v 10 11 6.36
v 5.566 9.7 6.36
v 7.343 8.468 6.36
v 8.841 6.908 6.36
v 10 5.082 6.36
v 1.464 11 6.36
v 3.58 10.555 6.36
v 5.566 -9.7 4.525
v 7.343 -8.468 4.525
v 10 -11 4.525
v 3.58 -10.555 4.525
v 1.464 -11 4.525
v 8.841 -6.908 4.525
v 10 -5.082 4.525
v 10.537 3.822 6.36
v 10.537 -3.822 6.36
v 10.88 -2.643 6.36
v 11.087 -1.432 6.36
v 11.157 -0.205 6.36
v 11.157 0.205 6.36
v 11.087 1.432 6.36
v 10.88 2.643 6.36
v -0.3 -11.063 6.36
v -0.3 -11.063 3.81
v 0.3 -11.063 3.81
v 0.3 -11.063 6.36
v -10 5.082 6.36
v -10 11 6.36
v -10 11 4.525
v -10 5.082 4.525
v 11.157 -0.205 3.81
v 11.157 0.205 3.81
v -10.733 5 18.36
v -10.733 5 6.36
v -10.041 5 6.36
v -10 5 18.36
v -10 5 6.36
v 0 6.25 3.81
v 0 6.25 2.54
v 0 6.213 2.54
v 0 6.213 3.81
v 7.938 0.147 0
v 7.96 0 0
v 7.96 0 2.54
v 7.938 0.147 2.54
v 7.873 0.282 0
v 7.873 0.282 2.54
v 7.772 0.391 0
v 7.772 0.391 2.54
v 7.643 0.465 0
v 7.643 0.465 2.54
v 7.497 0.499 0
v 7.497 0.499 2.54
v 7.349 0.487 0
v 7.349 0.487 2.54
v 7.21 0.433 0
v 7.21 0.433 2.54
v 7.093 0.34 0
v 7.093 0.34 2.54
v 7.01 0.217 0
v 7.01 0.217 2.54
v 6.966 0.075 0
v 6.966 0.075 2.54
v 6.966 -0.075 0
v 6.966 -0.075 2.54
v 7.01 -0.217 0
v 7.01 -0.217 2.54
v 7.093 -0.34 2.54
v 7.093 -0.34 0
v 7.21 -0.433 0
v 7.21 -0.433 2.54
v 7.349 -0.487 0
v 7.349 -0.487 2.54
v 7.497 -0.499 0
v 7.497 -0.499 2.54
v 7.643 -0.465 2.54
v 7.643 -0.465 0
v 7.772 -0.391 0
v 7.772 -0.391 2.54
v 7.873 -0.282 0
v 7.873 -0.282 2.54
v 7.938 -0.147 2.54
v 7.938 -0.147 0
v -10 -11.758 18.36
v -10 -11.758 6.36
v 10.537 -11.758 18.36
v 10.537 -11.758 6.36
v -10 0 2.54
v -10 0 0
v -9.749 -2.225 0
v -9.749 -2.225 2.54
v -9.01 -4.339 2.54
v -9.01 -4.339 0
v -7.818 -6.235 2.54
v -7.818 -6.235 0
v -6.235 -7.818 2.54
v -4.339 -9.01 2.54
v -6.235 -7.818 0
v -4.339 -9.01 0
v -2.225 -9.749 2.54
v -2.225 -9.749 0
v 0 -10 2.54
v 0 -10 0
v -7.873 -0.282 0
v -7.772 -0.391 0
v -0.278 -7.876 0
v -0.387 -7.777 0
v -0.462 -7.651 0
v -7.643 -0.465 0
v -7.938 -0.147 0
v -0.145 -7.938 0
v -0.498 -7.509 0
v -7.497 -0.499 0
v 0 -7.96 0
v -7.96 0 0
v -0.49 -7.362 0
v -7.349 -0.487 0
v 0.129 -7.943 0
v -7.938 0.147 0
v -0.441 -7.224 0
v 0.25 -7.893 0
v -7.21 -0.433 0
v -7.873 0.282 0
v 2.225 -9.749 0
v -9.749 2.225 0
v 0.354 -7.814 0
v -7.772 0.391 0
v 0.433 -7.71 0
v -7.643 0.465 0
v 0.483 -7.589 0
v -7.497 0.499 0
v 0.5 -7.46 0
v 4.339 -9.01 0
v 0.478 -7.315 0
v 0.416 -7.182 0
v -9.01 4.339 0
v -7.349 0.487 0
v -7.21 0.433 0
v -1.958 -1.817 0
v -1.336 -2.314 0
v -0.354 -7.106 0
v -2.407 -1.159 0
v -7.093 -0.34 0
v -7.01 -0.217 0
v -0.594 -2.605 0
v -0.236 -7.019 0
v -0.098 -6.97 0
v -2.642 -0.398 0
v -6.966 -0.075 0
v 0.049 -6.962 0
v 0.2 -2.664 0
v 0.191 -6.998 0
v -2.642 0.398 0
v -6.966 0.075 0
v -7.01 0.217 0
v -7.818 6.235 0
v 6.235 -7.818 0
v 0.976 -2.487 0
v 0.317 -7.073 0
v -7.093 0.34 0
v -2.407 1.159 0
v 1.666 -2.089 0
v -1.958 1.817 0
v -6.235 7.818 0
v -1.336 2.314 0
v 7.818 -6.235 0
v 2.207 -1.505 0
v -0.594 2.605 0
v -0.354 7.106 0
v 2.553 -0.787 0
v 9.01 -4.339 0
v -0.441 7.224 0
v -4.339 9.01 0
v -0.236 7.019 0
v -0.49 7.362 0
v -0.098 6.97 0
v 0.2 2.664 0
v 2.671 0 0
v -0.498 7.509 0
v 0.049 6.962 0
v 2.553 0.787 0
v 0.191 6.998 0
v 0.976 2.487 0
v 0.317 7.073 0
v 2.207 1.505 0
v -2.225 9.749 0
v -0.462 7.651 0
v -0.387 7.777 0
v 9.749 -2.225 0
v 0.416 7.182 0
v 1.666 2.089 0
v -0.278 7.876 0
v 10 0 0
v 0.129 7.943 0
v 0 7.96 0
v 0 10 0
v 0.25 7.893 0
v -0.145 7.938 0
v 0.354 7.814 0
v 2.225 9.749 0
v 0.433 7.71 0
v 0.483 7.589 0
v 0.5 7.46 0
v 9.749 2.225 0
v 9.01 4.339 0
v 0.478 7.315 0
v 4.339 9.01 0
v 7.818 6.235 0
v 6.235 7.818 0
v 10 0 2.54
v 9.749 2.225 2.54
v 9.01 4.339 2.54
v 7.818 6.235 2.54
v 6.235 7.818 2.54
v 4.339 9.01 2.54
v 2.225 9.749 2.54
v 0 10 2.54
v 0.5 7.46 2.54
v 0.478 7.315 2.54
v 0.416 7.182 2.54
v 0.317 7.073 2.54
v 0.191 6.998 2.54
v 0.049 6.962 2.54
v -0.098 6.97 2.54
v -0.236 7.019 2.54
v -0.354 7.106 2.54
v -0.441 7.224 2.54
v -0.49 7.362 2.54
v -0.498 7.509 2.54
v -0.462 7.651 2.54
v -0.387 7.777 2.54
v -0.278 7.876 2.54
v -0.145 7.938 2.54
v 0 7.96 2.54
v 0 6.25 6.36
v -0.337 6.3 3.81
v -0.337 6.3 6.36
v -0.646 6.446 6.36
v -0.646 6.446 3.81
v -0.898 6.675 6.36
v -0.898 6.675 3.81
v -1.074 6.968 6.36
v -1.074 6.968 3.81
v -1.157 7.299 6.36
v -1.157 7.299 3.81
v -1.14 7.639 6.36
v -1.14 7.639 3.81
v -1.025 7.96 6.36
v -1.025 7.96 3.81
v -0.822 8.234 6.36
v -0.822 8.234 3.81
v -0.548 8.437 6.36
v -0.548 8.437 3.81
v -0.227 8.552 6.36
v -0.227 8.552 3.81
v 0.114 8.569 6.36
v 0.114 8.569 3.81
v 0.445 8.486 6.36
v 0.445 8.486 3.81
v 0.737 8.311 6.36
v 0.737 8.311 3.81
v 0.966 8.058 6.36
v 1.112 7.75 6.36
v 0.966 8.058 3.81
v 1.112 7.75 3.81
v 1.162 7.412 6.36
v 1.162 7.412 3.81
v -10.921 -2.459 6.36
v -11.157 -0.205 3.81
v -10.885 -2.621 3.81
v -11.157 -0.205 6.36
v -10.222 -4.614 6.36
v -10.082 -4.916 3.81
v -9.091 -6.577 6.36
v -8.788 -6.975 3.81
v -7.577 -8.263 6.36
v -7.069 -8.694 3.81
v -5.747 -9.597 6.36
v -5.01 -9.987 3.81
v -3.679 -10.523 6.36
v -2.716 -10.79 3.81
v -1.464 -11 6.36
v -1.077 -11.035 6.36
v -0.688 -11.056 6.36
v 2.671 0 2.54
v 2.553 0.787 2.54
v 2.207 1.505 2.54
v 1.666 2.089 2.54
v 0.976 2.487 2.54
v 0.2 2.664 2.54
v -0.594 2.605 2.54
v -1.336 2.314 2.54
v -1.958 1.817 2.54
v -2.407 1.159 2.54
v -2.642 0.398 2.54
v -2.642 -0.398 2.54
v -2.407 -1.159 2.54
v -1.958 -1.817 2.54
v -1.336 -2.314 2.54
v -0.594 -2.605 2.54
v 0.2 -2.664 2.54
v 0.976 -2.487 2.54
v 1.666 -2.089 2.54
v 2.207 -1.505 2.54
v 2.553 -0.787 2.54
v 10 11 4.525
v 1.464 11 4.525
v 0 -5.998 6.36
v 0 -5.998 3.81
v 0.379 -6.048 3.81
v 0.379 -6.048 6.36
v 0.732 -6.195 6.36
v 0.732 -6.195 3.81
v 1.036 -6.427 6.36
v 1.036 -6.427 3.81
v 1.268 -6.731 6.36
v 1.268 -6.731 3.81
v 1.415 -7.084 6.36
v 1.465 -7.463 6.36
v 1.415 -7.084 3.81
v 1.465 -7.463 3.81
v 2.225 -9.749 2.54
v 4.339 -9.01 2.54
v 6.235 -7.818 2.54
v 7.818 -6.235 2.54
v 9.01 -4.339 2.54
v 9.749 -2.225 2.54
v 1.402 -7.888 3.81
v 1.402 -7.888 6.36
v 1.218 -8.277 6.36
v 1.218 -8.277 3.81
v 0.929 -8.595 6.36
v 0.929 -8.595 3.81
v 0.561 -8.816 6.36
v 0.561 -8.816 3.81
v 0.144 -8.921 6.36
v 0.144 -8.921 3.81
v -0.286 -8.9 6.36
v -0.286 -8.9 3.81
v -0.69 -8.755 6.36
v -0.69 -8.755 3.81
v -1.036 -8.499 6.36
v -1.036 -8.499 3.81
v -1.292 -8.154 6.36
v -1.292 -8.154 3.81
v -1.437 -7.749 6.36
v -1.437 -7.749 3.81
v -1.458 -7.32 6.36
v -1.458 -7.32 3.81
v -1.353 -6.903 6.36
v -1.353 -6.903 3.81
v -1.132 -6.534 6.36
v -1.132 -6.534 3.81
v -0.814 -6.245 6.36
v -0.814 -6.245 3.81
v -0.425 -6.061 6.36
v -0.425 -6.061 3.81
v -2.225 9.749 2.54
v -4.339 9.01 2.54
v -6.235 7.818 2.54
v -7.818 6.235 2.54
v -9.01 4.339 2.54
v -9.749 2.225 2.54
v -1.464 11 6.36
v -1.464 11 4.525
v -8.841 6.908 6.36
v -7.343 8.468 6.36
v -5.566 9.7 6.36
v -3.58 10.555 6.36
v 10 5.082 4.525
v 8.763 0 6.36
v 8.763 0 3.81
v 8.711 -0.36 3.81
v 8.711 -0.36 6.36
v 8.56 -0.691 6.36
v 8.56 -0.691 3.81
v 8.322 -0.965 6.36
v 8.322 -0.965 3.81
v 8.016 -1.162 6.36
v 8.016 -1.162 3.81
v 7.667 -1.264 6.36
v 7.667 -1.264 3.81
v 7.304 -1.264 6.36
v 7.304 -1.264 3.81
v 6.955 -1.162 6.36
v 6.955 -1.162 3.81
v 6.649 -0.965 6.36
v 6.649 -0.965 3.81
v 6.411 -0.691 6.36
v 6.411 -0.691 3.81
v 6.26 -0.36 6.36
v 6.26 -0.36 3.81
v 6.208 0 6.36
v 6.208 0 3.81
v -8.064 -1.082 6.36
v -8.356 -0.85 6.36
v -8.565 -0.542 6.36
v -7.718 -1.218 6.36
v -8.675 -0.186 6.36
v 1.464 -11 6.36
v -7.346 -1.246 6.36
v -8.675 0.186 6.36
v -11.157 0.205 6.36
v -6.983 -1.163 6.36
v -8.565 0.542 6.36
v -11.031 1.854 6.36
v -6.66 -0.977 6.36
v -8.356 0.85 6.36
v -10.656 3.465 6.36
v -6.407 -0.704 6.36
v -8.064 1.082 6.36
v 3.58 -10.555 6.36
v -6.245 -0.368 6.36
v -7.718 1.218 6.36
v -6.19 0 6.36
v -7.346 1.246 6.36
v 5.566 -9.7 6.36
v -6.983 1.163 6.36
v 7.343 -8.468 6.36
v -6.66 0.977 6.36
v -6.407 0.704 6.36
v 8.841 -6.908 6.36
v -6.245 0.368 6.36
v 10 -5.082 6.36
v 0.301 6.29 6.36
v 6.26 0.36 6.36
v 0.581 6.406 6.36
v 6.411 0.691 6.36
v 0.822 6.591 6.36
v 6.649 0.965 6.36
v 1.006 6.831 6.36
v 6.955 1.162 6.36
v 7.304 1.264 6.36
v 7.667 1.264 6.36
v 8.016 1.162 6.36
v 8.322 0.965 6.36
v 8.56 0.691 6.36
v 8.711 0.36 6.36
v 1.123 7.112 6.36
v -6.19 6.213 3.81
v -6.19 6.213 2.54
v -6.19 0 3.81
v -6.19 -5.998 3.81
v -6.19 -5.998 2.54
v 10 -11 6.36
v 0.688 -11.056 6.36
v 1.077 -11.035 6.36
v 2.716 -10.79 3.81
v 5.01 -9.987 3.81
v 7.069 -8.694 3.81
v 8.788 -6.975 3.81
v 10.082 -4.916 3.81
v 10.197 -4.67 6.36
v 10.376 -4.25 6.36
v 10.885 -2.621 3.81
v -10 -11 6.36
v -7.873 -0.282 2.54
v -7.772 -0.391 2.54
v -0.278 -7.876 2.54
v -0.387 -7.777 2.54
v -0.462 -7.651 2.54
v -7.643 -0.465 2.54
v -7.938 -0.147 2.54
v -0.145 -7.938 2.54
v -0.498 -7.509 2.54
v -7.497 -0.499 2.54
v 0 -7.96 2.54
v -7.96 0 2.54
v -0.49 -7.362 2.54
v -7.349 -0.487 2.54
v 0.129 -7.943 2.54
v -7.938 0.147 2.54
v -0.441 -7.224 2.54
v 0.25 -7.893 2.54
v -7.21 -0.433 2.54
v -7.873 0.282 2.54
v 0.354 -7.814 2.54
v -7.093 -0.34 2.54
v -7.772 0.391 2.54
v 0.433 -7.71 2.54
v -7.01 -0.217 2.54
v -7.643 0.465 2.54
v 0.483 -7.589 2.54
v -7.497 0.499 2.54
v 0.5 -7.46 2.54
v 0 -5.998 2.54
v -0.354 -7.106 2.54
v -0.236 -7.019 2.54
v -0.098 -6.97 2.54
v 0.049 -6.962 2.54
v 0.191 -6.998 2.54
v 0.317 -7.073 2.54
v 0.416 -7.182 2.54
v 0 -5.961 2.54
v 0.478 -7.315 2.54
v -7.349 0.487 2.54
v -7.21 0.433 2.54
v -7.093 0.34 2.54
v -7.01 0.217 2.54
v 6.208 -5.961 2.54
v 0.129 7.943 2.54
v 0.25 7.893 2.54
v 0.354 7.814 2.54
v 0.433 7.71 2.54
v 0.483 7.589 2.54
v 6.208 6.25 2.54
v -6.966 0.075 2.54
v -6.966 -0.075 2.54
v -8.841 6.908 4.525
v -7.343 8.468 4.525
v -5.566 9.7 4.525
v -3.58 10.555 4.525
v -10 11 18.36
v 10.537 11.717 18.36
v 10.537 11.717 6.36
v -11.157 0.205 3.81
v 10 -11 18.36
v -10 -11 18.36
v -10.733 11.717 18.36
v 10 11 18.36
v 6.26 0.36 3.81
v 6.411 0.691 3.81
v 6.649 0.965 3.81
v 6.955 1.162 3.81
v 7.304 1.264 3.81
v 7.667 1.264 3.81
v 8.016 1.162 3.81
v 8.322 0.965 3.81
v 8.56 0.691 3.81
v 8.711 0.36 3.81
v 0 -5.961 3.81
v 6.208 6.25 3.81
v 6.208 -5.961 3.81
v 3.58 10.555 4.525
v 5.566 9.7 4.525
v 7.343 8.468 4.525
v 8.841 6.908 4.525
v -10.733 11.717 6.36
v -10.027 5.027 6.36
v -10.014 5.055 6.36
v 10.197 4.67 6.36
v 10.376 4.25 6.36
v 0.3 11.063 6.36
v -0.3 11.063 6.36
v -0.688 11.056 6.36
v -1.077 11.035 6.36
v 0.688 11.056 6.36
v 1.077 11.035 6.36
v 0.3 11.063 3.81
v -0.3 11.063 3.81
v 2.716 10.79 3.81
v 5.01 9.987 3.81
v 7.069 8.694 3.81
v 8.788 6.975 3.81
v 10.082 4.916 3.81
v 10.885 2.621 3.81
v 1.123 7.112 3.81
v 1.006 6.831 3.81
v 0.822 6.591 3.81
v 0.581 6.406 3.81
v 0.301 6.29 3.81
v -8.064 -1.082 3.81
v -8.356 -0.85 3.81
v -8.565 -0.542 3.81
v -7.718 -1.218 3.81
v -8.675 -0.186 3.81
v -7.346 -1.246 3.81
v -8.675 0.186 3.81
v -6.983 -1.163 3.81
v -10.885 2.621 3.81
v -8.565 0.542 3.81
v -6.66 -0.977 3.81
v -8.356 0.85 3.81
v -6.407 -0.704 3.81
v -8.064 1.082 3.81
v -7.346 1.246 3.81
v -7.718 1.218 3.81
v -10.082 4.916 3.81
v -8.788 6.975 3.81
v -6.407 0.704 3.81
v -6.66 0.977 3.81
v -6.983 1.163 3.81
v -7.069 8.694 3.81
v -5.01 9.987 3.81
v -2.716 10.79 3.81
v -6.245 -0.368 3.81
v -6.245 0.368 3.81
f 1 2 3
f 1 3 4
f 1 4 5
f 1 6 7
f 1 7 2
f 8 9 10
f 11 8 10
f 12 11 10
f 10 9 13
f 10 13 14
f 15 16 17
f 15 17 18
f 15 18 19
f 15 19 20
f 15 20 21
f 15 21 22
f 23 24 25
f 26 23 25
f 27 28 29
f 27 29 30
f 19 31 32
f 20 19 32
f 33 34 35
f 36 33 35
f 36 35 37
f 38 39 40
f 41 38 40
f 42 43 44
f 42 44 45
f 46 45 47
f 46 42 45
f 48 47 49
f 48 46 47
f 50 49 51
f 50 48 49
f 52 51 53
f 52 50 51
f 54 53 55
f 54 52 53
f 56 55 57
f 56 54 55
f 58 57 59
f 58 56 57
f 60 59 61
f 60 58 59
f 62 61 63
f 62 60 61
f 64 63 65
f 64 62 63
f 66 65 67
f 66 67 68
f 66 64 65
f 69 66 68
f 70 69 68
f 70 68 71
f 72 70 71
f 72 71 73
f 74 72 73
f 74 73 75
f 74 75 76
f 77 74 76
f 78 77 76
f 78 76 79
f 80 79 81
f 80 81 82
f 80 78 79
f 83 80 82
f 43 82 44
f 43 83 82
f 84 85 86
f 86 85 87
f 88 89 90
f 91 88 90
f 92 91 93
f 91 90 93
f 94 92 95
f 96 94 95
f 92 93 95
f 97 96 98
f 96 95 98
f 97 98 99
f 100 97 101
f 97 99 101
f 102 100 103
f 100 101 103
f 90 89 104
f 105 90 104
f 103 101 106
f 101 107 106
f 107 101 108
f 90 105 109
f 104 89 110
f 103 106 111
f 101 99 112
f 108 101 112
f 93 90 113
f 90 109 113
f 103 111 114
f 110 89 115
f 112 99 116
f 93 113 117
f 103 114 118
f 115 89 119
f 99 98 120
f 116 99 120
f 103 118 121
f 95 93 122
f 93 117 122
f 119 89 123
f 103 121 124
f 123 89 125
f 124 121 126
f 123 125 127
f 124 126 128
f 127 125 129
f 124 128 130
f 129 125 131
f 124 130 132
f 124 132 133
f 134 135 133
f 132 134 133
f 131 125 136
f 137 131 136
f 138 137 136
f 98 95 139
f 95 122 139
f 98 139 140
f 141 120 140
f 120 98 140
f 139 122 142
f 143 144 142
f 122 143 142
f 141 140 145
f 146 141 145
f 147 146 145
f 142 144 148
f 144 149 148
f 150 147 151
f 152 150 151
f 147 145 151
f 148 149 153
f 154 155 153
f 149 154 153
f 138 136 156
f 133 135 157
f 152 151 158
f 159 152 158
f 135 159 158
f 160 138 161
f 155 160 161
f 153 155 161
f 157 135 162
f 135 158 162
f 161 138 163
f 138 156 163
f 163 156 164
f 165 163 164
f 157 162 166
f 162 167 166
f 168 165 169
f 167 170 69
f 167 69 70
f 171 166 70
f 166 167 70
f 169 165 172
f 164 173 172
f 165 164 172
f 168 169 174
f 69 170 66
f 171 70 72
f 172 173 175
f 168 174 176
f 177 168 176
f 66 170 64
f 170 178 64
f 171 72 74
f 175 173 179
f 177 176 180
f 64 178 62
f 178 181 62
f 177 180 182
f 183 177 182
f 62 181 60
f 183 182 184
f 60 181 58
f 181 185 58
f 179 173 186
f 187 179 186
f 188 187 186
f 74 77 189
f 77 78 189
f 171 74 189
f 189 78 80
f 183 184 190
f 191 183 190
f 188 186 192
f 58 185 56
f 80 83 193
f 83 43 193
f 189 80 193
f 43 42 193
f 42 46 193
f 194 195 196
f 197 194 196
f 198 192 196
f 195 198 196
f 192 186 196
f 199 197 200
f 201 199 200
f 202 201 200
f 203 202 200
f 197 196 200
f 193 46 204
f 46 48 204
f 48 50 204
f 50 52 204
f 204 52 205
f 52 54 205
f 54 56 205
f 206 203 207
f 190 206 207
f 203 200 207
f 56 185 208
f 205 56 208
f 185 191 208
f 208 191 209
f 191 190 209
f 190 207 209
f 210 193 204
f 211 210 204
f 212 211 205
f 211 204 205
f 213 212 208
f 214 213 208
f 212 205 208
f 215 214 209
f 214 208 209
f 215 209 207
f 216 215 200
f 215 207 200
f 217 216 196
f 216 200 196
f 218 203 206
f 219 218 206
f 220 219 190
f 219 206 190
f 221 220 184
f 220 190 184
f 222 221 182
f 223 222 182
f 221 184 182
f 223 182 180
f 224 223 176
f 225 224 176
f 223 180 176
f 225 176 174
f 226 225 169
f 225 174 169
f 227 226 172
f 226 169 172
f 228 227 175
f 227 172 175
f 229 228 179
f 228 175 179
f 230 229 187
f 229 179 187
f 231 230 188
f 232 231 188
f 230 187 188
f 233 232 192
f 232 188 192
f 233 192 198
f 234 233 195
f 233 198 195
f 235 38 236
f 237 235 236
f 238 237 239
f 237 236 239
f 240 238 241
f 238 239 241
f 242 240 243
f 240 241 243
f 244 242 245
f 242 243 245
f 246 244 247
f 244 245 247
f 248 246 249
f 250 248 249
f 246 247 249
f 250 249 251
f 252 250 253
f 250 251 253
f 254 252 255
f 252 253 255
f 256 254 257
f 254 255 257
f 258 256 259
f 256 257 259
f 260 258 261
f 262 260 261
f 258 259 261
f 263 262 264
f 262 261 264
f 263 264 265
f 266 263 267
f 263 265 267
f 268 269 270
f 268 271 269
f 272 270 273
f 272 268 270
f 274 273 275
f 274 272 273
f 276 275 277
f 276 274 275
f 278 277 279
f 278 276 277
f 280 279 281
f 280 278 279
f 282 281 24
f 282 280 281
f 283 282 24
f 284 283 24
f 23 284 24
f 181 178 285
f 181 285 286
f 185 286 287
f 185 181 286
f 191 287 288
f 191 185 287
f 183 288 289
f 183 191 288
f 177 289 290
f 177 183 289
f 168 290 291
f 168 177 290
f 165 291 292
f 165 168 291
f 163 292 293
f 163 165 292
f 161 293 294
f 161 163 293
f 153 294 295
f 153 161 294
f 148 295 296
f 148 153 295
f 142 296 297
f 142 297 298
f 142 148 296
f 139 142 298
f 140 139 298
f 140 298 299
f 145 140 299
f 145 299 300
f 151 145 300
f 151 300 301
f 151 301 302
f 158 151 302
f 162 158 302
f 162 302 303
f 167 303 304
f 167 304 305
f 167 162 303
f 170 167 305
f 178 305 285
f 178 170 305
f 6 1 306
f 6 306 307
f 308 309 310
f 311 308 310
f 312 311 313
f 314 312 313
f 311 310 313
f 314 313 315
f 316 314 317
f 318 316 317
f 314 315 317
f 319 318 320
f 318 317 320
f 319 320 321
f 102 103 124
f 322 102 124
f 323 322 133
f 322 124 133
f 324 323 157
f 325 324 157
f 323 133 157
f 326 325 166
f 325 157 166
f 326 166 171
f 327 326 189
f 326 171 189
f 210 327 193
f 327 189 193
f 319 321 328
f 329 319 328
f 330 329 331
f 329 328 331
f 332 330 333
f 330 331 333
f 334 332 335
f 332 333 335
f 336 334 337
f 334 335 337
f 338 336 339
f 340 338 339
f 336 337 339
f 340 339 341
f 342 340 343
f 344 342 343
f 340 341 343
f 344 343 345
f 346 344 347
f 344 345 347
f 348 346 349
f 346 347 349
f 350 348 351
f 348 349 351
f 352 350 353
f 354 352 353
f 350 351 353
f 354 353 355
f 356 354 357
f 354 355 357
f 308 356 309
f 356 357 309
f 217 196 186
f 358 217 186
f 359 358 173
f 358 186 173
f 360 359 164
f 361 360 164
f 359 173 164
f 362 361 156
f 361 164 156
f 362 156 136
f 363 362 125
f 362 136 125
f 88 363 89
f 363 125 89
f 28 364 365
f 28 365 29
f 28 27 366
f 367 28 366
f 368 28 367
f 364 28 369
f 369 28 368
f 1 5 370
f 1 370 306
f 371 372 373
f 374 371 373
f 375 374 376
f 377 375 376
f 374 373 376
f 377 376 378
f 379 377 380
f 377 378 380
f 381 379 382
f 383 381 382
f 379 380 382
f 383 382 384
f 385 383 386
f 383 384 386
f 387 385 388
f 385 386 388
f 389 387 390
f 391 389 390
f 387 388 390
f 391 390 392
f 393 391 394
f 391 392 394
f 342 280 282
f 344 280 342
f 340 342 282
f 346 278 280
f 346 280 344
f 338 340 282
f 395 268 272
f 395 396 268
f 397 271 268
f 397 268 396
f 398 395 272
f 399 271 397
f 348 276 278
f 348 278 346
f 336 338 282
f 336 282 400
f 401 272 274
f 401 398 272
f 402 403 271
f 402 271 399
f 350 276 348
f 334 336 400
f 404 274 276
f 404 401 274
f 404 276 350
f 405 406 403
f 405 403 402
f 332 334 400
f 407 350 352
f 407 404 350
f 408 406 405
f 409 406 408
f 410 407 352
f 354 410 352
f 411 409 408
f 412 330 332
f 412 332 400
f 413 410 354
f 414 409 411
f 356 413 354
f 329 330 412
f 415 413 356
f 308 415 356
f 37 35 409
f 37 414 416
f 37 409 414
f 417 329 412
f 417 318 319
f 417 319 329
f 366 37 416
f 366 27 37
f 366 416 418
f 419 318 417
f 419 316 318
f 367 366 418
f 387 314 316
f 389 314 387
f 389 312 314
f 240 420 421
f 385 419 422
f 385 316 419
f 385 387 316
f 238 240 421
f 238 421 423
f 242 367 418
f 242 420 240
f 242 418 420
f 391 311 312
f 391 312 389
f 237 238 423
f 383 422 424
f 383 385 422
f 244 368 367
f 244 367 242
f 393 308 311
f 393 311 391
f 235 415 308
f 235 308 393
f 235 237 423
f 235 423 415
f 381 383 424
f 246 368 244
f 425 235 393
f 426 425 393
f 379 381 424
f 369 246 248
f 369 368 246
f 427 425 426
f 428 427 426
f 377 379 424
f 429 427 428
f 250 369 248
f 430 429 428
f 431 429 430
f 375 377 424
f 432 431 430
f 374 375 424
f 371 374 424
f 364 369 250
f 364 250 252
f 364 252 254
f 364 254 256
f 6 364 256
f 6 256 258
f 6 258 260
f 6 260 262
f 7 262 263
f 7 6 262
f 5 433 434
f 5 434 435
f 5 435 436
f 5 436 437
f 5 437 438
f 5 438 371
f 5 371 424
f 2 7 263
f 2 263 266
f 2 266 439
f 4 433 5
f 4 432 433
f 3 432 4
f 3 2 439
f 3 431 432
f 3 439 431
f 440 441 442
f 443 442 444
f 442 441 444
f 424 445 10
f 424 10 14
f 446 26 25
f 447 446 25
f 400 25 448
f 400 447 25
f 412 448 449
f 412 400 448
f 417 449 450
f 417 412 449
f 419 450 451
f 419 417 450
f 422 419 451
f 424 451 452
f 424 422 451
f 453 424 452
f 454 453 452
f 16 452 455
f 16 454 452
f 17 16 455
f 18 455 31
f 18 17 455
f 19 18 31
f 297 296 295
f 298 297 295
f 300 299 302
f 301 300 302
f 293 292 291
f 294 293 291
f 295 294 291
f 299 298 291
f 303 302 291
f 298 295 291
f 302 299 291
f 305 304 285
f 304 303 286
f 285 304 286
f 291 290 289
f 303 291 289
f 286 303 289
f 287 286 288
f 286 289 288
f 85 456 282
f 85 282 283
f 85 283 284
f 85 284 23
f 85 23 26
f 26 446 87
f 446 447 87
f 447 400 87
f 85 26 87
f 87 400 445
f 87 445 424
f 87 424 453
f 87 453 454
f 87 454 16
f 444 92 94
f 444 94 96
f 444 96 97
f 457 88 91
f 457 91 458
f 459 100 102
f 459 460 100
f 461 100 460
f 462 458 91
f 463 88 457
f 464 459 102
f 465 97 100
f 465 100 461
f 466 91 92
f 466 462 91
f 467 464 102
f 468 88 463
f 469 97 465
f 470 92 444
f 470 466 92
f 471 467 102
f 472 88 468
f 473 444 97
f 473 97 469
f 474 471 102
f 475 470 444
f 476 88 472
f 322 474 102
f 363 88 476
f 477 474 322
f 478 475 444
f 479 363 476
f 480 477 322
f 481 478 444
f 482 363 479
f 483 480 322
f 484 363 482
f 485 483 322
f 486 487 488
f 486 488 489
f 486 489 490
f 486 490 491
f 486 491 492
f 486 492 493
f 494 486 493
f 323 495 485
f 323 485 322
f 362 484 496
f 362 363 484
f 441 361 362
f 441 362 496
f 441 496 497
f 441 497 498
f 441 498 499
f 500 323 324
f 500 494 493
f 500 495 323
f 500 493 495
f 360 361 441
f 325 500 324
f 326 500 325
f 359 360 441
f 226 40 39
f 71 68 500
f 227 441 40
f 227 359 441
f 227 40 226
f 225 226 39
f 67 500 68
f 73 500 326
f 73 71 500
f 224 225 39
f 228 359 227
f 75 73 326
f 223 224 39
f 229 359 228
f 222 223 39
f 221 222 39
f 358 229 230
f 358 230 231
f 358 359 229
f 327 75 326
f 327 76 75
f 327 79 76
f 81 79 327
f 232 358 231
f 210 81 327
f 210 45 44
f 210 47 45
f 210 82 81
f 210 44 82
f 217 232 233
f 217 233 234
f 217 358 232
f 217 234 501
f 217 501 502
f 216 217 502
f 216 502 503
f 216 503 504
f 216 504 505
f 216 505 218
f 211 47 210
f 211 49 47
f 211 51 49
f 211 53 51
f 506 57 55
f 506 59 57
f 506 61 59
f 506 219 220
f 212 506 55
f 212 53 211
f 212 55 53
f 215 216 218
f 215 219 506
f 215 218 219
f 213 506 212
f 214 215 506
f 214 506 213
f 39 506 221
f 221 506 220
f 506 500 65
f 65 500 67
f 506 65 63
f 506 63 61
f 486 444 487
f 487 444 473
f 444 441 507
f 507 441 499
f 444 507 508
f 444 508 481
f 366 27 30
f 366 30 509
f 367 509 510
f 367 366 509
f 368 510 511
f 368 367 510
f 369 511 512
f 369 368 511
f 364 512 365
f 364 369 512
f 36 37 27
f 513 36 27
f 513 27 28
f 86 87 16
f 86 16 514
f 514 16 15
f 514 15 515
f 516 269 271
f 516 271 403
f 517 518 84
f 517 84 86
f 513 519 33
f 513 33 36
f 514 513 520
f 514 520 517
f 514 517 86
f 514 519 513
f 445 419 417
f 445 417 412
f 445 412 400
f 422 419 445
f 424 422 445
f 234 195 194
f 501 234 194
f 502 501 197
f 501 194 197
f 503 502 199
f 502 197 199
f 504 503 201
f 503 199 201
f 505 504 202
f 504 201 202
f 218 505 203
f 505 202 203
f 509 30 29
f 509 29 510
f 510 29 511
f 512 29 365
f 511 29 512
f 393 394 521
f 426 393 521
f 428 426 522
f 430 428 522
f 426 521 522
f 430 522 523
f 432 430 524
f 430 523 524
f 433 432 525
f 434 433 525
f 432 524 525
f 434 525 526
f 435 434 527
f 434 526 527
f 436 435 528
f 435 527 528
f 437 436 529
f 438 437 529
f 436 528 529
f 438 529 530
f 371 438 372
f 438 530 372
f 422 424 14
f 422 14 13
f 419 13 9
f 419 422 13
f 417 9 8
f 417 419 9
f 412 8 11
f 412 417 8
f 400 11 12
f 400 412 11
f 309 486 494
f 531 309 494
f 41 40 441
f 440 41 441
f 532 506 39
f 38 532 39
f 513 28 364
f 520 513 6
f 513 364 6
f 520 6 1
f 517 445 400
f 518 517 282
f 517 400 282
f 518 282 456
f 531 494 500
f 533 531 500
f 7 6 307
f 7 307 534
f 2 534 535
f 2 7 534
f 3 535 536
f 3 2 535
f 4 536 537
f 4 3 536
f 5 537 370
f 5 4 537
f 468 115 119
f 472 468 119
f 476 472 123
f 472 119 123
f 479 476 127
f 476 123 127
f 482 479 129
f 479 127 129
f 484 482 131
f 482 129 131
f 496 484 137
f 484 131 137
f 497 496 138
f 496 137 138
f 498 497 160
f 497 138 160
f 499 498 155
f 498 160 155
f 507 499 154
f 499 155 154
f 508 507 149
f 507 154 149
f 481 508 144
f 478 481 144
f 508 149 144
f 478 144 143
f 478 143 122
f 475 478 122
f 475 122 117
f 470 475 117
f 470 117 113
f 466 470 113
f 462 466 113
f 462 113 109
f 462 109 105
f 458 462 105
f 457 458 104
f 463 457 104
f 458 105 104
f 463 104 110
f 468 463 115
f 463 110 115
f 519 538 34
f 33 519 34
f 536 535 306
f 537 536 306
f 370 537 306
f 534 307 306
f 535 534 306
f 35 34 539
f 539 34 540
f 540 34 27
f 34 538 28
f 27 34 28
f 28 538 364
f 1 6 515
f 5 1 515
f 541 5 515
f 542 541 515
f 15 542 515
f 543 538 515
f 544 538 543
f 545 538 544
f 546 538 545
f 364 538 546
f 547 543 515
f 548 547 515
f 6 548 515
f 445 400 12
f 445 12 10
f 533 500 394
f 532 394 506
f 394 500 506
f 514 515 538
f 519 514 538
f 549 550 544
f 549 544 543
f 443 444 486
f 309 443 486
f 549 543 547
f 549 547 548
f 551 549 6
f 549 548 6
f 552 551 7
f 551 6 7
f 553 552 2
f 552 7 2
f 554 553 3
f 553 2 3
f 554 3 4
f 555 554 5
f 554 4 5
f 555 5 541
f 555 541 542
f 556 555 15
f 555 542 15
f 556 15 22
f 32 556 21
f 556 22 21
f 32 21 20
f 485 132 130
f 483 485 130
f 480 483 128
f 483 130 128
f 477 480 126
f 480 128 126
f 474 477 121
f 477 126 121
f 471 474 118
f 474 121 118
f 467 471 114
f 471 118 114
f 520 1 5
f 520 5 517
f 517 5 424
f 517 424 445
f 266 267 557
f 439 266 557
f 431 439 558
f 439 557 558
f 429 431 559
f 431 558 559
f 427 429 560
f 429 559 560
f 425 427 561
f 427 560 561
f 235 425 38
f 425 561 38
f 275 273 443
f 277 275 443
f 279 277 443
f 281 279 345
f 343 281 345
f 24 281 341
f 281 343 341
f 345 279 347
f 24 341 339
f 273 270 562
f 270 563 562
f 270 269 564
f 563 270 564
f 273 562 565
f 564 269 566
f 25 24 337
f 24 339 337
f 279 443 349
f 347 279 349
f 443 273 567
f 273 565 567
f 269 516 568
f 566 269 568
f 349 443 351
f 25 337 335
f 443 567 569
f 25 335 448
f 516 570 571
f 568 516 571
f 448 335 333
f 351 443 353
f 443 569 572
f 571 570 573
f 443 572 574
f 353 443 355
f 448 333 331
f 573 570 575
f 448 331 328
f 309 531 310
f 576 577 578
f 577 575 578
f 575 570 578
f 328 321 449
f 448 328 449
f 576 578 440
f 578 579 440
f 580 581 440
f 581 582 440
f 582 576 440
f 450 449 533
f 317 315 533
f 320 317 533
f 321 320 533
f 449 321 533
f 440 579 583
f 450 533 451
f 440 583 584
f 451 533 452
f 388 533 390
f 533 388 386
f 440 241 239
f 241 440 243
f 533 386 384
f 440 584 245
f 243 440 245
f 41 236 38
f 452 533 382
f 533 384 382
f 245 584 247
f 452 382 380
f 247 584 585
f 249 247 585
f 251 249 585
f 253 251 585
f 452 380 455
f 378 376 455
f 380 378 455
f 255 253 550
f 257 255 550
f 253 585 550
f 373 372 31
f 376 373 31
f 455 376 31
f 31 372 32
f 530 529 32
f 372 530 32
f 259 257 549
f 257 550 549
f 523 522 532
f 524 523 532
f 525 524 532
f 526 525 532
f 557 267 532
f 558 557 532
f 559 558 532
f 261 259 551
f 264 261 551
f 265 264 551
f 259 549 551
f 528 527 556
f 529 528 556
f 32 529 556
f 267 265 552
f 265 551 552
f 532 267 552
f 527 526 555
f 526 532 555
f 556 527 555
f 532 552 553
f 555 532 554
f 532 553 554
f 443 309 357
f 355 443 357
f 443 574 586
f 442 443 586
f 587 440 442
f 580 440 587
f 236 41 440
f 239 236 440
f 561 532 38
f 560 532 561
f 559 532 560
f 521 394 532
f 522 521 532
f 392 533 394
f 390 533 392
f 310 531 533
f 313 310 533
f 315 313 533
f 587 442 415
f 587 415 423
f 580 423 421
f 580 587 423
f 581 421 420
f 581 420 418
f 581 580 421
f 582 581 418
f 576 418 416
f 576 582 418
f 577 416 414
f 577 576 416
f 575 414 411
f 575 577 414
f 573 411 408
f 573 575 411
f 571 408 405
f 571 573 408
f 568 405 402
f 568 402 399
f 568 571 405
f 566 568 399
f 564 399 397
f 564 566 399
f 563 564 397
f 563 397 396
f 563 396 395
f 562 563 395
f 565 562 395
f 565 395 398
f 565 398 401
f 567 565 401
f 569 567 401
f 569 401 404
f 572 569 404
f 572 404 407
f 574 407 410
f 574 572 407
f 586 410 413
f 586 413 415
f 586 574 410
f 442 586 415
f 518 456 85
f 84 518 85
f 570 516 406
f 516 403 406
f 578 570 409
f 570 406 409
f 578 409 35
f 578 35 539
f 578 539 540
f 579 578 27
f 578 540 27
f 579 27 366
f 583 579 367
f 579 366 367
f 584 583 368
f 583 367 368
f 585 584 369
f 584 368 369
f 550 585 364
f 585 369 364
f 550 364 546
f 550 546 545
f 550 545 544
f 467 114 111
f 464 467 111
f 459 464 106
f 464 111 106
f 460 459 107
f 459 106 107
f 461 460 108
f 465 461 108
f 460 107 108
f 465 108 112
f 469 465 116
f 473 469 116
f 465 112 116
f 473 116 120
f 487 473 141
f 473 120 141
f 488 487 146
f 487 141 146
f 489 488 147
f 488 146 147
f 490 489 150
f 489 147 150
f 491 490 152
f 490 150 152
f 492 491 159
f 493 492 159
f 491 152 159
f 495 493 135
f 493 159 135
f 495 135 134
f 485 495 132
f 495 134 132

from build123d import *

# Parameters (mm, degrees)
F0_R     = 2.6714797436
F0_R_2   = 0.5
F1_DEPTH = 2.54
F3_DEPTH = 1.27
F4_W     = 22.3138332367
F4_H     = 22.1251994371
F4_R     = 1.2496784329
F5_DEPTH = 2.5495402515
F6_R     = 10.8571928441
F8_DEPTH = 12
F9_DEPTH = 1.83495


with BuildPart() as f1:
    # F0 (on Top) → F1 (new body)
    with BuildSketch(Plane.XY):
        with BuildLine():
            ThreePointArc((0, -10), (7.0710678119, -7.0710678119), (10, 0))
            ThreePointArc((10, 0), (7.0710678119, 7.0710678119), (0, 10))
            ThreePointArc((0, 10), (-7.0710678119, 7.0710678119), (-10, 0))
            ThreePointArc((-10, 0), (-7.0710678119, -7.0710678119), (0, -10))
        make_face()
        with BuildLine():
            ThreePointArc((0.5, -7.46), (0.3535533906, -7.8135533906), (0, -7.96))
            ThreePointArc((0, -7.96), (-0.3535533906, -7.1064466094), (0.5, -7.46))
        make_face(mode=Mode.SUBTRACT)
        with BuildLine():
            ThreePointArc((-6.96, 0), (-7.46, -0.5), (-7.96, 0))
            ThreePointArc((-7.96, 0), (-7.46, 0.5), (-6.96, 0))
        make_face(mode=Mode.SUBTRACT)
        Circle(F0_R, mode=Mode.SUBTRACT)
        with Locations((7.46, 0)):
            Circle(F0_R_2, mode=Mode.SUBTRACT)
        with BuildLine():
            ThreePointArc((0.5, 7.46), (-0.3535533906, 7.1064466094), (0, 7.96))
            ThreePointArc((0, 7.96), (0.3535533906, 7.8135533906), (0.5, 7.46))
        make_face(mode=Mode.SUBTRACT)
    extrude(amount=F1_DEPTH)

    # F2 (on face) → F3 (join)
    with BuildSketch(Plane.XY.offset(2.54)):
        with BuildLine():
            Line((-6.1897560954, 0), (-2.6714797436, 0))
            ThreePointArc((-2.6714797436, 0), (-1.8890214425, 1.8890214425), (0, 2.6714797436))
            Line((0, 2.6714797436), (0, 6.2129776925))
            Line((0, 6.2129776925), (-6.1897560954, 6.2129776925))
            Line((-6.1897560954, 6.2129776925), (-6.1897560954, 0))
        make_face()
        with BuildLine():
            Line((0, 6.2129776925), (0, 2.6714797436))
            ThreePointArc((0, 2.6714797436), (1.8890214425, 1.8890214425), (2.6714797436, 0))
            Line((2.6714797436, 0), (6.2083564699, 0))
            Line((6.2083564699, 0), (6.2083564699, 6.2503200024))
            Line((6.2083564699, 6.2503200024), (0, 6.2503200024))
            Line((0, 6.2503200024), (0, 6.2129776925))
        make_face()
        with BuildLine():
            ThreePointArc((0, -2.6714797436), (-1.8890214425, -1.8890214425), (-2.6714797436, 0))
            Line((-2.6714797436, 0), (-6.1897560954, 0))
            Line((-6.1897560954, 0), (-6.1897560954, -5.9984177351))
            Line((-6.1897560954, -5.9984177351), (0, -5.9984177351))
            Line((0, -5.9984177351), (0, -5.9610754251))
            Line((0, -5.9610754251), (0, -2.6714797436))
        make_face()
        with BuildLine():
            ThreePointArc((2.6714797436, 0), (1.8890214425, -1.8890214425), (0, -2.6714797436))
            Line((0, -2.6714797436), (0, -5.9610754251))
            Line((0, -5.9610754251), (6.2083564699, -5.9610754251))
            Line((6.2083564699, -5.9610754251), (6.2083564699, 0))
            Line((6.2083564699, 0), (2.6714797436, 0))
        make_face()
        with BuildLine():
            Line((2.6714797436, 0), (0, 0))
            Line((0, 0), (0, -2.6714797436))
            ThreePointArc((0, -2.6714797436), (1.8890214425, -1.8890214425), (2.6714797436, 0))
        make_face()
        with BuildLine():
            Line((0, -2.6714797436), (0, 0))
            Line((0, 0), (-2.6714797436, 0))
            ThreePointArc((-2.6714797436, 0), (-1.8890214425, -1.8890214425), (0, -2.6714797436))
        make_face()
        with BuildLine():
            Line((-2.6714797436, 0), (0, 0))
            Line((0, 0), (0, 2.6714797436))
            ThreePointArc((0, 2.6714797436), (-1.8890214425, 1.8890214425), (-2.6714797436, 0))
        make_face()
        with BuildLine():
            Line((0, 2.6714797436), (0, 0))
            Line((0, 0), (2.6714797436, 0))
            ThreePointArc((2.6714797436, 0), (1.8890214425, 1.8890214425), (0, 2.6714797436))
        make_face()
    extrude(amount=F3_DEPTH)

    # F4 (on face) → F5 (join)
    with BuildSketch(Plane.XY.offset(3.81)):
        Rectangle(F4_W, F4_H)
        with BuildLine():
            ThreePointArc((1.4647059143, -7.4631236494), (-1.0357034844, -8.4988271338), (0, -5.9984177351))
            ThreePointArc((0, -5.9984177351), (1.0357034844, -6.4274201649), (1.4647059143, -7.4631236494))
        make_face(mode=Mode.SUBTRACT)
        with Locations((-7.4394345284, 0)):
            Circle(F4_R, mode=Mode.SUBTRACT)
        Polygon((-6.1897560954, -5.9984177351), (-6.1897560954, 0), (-6.1897560954, 6.2129776925), (0, 6.2129776925), (0, 6.2503200024), (6.2083564699, 6.2503200024), (6.2083564699, 0), (6.2083564699, -5.9610754251), (0, -5.9610754251), (0, -5.9984177351), align=None, mode=Mode.SUBTRACT)
        with BuildLine():
            ThreePointArc((8.763005957, 0), (7.4856812134, -1.2773247436), (6.2083564699, 0))
            ThreePointArc((6.2083564699, 0), (7.4856812134, 1.2773247436), (8.763005957, 0))
        make_face(mode=Mode.SUBTRACT)
        with BuildLine():
            ThreePointArc((1.1621620506, 7.412482053), (0.8217726668, 6.5907093862), (0, 6.2503200024))
            ThreePointArc((0, 6.2503200024), (-0.8217726668, 8.2342547199), (1.1621620506, 7.412482053))
        make_face(mode=Mode.SUBTRACT)
        Polygon((-6.1897560954, 6.2129776925), (-6.1897560954, 0), (-6.1897560954, -5.9984177351), (0, -5.9984177351), (0, -5.9610754251), (6.2083564699, -5.9610754251), (6.2083564699, 0), (6.2083564699, 6.2503200024), (0, 6.2503200024), (0, 6.2129776925), align=None)
    extrude(amount=F5_DEPTH)

    # F6
    f6_edges = [f1.edges().sort_by_distance(p)[0] for p in [
        (-11.156917, -11.0626, 5.08477),
        (11.156917, -11.0626, 5.08477),
        (11.156917, 11.0626, 5.08477),
        (-11.156917, 11.0626, 5.08477),
    ]]
    fillet(f6_edges, radius=F6_R)

    # F7 (on face) → F8 (join)
    with BuildSketch(Plane.XY.offset(6.3595402515)):
        Polygon((-10, 11), (10, 11), (10, -11), (-10, -11), (-10, -11.7575069889), (10.5367284268, -11.7575069889), (10.5367284268, 11.7169851437), (-10.7332030311, 11.7169851437), (-10.7332030311, 5), (-10, 5), align=None)
    extrude(amount=F8_DEPTH)


with BuildPart() as f9:
    # F7 (on face) → F9 (new body)
    with BuildSketch(Plane.XY.offset(6.3595402515)):
        with BuildLine():
            Line((10, 5.0822170613), (10, 11))
            Line((10, 11), (1.4639384058, 11))
            ThreePointArc((1.4639384058, 11), (6.4855405452, 9.1280918588), (10, 5.0822170613))
        make_face()
    extrude(amount=-F9_DEPTH)


with BuildPart() as f9b:
    # F7 (on face) → F9, piece 2 (new body)
    with BuildSketch(Plane.XY.offset(6.3595402515)):
        with BuildLine():
            Line((10, -11), (10, -5.0822170613))
            ThreePointArc((10, -5.0822170613), (6.4855405452, -9.1280918588), (1.4639384058, -11))
            Line((1.4639384058, -11), (10, -11))
        make_face()
    extrude(amount=-F9_DEPTH)


with BuildPart() as f9c:
    # F7 (on face) → F9, piece 3 (new body)
    with BuildSketch(Plane.XY.offset(6.3595402515)):
        with BuildLine():
            ThreePointArc((-10, 5.0822170613), (-6.4855405452, 9.1280918588), (-1.4639384058, 11))
            Line((-1.4639384058, 11), (-10, 11))
            Line((-10, 11), (-10, 5.0822170613))
        make_face()
    extrude(amount=-F9_DEPTH)


solid = Compound([f1.part, f9.part, f9b.part, f9c.part])
